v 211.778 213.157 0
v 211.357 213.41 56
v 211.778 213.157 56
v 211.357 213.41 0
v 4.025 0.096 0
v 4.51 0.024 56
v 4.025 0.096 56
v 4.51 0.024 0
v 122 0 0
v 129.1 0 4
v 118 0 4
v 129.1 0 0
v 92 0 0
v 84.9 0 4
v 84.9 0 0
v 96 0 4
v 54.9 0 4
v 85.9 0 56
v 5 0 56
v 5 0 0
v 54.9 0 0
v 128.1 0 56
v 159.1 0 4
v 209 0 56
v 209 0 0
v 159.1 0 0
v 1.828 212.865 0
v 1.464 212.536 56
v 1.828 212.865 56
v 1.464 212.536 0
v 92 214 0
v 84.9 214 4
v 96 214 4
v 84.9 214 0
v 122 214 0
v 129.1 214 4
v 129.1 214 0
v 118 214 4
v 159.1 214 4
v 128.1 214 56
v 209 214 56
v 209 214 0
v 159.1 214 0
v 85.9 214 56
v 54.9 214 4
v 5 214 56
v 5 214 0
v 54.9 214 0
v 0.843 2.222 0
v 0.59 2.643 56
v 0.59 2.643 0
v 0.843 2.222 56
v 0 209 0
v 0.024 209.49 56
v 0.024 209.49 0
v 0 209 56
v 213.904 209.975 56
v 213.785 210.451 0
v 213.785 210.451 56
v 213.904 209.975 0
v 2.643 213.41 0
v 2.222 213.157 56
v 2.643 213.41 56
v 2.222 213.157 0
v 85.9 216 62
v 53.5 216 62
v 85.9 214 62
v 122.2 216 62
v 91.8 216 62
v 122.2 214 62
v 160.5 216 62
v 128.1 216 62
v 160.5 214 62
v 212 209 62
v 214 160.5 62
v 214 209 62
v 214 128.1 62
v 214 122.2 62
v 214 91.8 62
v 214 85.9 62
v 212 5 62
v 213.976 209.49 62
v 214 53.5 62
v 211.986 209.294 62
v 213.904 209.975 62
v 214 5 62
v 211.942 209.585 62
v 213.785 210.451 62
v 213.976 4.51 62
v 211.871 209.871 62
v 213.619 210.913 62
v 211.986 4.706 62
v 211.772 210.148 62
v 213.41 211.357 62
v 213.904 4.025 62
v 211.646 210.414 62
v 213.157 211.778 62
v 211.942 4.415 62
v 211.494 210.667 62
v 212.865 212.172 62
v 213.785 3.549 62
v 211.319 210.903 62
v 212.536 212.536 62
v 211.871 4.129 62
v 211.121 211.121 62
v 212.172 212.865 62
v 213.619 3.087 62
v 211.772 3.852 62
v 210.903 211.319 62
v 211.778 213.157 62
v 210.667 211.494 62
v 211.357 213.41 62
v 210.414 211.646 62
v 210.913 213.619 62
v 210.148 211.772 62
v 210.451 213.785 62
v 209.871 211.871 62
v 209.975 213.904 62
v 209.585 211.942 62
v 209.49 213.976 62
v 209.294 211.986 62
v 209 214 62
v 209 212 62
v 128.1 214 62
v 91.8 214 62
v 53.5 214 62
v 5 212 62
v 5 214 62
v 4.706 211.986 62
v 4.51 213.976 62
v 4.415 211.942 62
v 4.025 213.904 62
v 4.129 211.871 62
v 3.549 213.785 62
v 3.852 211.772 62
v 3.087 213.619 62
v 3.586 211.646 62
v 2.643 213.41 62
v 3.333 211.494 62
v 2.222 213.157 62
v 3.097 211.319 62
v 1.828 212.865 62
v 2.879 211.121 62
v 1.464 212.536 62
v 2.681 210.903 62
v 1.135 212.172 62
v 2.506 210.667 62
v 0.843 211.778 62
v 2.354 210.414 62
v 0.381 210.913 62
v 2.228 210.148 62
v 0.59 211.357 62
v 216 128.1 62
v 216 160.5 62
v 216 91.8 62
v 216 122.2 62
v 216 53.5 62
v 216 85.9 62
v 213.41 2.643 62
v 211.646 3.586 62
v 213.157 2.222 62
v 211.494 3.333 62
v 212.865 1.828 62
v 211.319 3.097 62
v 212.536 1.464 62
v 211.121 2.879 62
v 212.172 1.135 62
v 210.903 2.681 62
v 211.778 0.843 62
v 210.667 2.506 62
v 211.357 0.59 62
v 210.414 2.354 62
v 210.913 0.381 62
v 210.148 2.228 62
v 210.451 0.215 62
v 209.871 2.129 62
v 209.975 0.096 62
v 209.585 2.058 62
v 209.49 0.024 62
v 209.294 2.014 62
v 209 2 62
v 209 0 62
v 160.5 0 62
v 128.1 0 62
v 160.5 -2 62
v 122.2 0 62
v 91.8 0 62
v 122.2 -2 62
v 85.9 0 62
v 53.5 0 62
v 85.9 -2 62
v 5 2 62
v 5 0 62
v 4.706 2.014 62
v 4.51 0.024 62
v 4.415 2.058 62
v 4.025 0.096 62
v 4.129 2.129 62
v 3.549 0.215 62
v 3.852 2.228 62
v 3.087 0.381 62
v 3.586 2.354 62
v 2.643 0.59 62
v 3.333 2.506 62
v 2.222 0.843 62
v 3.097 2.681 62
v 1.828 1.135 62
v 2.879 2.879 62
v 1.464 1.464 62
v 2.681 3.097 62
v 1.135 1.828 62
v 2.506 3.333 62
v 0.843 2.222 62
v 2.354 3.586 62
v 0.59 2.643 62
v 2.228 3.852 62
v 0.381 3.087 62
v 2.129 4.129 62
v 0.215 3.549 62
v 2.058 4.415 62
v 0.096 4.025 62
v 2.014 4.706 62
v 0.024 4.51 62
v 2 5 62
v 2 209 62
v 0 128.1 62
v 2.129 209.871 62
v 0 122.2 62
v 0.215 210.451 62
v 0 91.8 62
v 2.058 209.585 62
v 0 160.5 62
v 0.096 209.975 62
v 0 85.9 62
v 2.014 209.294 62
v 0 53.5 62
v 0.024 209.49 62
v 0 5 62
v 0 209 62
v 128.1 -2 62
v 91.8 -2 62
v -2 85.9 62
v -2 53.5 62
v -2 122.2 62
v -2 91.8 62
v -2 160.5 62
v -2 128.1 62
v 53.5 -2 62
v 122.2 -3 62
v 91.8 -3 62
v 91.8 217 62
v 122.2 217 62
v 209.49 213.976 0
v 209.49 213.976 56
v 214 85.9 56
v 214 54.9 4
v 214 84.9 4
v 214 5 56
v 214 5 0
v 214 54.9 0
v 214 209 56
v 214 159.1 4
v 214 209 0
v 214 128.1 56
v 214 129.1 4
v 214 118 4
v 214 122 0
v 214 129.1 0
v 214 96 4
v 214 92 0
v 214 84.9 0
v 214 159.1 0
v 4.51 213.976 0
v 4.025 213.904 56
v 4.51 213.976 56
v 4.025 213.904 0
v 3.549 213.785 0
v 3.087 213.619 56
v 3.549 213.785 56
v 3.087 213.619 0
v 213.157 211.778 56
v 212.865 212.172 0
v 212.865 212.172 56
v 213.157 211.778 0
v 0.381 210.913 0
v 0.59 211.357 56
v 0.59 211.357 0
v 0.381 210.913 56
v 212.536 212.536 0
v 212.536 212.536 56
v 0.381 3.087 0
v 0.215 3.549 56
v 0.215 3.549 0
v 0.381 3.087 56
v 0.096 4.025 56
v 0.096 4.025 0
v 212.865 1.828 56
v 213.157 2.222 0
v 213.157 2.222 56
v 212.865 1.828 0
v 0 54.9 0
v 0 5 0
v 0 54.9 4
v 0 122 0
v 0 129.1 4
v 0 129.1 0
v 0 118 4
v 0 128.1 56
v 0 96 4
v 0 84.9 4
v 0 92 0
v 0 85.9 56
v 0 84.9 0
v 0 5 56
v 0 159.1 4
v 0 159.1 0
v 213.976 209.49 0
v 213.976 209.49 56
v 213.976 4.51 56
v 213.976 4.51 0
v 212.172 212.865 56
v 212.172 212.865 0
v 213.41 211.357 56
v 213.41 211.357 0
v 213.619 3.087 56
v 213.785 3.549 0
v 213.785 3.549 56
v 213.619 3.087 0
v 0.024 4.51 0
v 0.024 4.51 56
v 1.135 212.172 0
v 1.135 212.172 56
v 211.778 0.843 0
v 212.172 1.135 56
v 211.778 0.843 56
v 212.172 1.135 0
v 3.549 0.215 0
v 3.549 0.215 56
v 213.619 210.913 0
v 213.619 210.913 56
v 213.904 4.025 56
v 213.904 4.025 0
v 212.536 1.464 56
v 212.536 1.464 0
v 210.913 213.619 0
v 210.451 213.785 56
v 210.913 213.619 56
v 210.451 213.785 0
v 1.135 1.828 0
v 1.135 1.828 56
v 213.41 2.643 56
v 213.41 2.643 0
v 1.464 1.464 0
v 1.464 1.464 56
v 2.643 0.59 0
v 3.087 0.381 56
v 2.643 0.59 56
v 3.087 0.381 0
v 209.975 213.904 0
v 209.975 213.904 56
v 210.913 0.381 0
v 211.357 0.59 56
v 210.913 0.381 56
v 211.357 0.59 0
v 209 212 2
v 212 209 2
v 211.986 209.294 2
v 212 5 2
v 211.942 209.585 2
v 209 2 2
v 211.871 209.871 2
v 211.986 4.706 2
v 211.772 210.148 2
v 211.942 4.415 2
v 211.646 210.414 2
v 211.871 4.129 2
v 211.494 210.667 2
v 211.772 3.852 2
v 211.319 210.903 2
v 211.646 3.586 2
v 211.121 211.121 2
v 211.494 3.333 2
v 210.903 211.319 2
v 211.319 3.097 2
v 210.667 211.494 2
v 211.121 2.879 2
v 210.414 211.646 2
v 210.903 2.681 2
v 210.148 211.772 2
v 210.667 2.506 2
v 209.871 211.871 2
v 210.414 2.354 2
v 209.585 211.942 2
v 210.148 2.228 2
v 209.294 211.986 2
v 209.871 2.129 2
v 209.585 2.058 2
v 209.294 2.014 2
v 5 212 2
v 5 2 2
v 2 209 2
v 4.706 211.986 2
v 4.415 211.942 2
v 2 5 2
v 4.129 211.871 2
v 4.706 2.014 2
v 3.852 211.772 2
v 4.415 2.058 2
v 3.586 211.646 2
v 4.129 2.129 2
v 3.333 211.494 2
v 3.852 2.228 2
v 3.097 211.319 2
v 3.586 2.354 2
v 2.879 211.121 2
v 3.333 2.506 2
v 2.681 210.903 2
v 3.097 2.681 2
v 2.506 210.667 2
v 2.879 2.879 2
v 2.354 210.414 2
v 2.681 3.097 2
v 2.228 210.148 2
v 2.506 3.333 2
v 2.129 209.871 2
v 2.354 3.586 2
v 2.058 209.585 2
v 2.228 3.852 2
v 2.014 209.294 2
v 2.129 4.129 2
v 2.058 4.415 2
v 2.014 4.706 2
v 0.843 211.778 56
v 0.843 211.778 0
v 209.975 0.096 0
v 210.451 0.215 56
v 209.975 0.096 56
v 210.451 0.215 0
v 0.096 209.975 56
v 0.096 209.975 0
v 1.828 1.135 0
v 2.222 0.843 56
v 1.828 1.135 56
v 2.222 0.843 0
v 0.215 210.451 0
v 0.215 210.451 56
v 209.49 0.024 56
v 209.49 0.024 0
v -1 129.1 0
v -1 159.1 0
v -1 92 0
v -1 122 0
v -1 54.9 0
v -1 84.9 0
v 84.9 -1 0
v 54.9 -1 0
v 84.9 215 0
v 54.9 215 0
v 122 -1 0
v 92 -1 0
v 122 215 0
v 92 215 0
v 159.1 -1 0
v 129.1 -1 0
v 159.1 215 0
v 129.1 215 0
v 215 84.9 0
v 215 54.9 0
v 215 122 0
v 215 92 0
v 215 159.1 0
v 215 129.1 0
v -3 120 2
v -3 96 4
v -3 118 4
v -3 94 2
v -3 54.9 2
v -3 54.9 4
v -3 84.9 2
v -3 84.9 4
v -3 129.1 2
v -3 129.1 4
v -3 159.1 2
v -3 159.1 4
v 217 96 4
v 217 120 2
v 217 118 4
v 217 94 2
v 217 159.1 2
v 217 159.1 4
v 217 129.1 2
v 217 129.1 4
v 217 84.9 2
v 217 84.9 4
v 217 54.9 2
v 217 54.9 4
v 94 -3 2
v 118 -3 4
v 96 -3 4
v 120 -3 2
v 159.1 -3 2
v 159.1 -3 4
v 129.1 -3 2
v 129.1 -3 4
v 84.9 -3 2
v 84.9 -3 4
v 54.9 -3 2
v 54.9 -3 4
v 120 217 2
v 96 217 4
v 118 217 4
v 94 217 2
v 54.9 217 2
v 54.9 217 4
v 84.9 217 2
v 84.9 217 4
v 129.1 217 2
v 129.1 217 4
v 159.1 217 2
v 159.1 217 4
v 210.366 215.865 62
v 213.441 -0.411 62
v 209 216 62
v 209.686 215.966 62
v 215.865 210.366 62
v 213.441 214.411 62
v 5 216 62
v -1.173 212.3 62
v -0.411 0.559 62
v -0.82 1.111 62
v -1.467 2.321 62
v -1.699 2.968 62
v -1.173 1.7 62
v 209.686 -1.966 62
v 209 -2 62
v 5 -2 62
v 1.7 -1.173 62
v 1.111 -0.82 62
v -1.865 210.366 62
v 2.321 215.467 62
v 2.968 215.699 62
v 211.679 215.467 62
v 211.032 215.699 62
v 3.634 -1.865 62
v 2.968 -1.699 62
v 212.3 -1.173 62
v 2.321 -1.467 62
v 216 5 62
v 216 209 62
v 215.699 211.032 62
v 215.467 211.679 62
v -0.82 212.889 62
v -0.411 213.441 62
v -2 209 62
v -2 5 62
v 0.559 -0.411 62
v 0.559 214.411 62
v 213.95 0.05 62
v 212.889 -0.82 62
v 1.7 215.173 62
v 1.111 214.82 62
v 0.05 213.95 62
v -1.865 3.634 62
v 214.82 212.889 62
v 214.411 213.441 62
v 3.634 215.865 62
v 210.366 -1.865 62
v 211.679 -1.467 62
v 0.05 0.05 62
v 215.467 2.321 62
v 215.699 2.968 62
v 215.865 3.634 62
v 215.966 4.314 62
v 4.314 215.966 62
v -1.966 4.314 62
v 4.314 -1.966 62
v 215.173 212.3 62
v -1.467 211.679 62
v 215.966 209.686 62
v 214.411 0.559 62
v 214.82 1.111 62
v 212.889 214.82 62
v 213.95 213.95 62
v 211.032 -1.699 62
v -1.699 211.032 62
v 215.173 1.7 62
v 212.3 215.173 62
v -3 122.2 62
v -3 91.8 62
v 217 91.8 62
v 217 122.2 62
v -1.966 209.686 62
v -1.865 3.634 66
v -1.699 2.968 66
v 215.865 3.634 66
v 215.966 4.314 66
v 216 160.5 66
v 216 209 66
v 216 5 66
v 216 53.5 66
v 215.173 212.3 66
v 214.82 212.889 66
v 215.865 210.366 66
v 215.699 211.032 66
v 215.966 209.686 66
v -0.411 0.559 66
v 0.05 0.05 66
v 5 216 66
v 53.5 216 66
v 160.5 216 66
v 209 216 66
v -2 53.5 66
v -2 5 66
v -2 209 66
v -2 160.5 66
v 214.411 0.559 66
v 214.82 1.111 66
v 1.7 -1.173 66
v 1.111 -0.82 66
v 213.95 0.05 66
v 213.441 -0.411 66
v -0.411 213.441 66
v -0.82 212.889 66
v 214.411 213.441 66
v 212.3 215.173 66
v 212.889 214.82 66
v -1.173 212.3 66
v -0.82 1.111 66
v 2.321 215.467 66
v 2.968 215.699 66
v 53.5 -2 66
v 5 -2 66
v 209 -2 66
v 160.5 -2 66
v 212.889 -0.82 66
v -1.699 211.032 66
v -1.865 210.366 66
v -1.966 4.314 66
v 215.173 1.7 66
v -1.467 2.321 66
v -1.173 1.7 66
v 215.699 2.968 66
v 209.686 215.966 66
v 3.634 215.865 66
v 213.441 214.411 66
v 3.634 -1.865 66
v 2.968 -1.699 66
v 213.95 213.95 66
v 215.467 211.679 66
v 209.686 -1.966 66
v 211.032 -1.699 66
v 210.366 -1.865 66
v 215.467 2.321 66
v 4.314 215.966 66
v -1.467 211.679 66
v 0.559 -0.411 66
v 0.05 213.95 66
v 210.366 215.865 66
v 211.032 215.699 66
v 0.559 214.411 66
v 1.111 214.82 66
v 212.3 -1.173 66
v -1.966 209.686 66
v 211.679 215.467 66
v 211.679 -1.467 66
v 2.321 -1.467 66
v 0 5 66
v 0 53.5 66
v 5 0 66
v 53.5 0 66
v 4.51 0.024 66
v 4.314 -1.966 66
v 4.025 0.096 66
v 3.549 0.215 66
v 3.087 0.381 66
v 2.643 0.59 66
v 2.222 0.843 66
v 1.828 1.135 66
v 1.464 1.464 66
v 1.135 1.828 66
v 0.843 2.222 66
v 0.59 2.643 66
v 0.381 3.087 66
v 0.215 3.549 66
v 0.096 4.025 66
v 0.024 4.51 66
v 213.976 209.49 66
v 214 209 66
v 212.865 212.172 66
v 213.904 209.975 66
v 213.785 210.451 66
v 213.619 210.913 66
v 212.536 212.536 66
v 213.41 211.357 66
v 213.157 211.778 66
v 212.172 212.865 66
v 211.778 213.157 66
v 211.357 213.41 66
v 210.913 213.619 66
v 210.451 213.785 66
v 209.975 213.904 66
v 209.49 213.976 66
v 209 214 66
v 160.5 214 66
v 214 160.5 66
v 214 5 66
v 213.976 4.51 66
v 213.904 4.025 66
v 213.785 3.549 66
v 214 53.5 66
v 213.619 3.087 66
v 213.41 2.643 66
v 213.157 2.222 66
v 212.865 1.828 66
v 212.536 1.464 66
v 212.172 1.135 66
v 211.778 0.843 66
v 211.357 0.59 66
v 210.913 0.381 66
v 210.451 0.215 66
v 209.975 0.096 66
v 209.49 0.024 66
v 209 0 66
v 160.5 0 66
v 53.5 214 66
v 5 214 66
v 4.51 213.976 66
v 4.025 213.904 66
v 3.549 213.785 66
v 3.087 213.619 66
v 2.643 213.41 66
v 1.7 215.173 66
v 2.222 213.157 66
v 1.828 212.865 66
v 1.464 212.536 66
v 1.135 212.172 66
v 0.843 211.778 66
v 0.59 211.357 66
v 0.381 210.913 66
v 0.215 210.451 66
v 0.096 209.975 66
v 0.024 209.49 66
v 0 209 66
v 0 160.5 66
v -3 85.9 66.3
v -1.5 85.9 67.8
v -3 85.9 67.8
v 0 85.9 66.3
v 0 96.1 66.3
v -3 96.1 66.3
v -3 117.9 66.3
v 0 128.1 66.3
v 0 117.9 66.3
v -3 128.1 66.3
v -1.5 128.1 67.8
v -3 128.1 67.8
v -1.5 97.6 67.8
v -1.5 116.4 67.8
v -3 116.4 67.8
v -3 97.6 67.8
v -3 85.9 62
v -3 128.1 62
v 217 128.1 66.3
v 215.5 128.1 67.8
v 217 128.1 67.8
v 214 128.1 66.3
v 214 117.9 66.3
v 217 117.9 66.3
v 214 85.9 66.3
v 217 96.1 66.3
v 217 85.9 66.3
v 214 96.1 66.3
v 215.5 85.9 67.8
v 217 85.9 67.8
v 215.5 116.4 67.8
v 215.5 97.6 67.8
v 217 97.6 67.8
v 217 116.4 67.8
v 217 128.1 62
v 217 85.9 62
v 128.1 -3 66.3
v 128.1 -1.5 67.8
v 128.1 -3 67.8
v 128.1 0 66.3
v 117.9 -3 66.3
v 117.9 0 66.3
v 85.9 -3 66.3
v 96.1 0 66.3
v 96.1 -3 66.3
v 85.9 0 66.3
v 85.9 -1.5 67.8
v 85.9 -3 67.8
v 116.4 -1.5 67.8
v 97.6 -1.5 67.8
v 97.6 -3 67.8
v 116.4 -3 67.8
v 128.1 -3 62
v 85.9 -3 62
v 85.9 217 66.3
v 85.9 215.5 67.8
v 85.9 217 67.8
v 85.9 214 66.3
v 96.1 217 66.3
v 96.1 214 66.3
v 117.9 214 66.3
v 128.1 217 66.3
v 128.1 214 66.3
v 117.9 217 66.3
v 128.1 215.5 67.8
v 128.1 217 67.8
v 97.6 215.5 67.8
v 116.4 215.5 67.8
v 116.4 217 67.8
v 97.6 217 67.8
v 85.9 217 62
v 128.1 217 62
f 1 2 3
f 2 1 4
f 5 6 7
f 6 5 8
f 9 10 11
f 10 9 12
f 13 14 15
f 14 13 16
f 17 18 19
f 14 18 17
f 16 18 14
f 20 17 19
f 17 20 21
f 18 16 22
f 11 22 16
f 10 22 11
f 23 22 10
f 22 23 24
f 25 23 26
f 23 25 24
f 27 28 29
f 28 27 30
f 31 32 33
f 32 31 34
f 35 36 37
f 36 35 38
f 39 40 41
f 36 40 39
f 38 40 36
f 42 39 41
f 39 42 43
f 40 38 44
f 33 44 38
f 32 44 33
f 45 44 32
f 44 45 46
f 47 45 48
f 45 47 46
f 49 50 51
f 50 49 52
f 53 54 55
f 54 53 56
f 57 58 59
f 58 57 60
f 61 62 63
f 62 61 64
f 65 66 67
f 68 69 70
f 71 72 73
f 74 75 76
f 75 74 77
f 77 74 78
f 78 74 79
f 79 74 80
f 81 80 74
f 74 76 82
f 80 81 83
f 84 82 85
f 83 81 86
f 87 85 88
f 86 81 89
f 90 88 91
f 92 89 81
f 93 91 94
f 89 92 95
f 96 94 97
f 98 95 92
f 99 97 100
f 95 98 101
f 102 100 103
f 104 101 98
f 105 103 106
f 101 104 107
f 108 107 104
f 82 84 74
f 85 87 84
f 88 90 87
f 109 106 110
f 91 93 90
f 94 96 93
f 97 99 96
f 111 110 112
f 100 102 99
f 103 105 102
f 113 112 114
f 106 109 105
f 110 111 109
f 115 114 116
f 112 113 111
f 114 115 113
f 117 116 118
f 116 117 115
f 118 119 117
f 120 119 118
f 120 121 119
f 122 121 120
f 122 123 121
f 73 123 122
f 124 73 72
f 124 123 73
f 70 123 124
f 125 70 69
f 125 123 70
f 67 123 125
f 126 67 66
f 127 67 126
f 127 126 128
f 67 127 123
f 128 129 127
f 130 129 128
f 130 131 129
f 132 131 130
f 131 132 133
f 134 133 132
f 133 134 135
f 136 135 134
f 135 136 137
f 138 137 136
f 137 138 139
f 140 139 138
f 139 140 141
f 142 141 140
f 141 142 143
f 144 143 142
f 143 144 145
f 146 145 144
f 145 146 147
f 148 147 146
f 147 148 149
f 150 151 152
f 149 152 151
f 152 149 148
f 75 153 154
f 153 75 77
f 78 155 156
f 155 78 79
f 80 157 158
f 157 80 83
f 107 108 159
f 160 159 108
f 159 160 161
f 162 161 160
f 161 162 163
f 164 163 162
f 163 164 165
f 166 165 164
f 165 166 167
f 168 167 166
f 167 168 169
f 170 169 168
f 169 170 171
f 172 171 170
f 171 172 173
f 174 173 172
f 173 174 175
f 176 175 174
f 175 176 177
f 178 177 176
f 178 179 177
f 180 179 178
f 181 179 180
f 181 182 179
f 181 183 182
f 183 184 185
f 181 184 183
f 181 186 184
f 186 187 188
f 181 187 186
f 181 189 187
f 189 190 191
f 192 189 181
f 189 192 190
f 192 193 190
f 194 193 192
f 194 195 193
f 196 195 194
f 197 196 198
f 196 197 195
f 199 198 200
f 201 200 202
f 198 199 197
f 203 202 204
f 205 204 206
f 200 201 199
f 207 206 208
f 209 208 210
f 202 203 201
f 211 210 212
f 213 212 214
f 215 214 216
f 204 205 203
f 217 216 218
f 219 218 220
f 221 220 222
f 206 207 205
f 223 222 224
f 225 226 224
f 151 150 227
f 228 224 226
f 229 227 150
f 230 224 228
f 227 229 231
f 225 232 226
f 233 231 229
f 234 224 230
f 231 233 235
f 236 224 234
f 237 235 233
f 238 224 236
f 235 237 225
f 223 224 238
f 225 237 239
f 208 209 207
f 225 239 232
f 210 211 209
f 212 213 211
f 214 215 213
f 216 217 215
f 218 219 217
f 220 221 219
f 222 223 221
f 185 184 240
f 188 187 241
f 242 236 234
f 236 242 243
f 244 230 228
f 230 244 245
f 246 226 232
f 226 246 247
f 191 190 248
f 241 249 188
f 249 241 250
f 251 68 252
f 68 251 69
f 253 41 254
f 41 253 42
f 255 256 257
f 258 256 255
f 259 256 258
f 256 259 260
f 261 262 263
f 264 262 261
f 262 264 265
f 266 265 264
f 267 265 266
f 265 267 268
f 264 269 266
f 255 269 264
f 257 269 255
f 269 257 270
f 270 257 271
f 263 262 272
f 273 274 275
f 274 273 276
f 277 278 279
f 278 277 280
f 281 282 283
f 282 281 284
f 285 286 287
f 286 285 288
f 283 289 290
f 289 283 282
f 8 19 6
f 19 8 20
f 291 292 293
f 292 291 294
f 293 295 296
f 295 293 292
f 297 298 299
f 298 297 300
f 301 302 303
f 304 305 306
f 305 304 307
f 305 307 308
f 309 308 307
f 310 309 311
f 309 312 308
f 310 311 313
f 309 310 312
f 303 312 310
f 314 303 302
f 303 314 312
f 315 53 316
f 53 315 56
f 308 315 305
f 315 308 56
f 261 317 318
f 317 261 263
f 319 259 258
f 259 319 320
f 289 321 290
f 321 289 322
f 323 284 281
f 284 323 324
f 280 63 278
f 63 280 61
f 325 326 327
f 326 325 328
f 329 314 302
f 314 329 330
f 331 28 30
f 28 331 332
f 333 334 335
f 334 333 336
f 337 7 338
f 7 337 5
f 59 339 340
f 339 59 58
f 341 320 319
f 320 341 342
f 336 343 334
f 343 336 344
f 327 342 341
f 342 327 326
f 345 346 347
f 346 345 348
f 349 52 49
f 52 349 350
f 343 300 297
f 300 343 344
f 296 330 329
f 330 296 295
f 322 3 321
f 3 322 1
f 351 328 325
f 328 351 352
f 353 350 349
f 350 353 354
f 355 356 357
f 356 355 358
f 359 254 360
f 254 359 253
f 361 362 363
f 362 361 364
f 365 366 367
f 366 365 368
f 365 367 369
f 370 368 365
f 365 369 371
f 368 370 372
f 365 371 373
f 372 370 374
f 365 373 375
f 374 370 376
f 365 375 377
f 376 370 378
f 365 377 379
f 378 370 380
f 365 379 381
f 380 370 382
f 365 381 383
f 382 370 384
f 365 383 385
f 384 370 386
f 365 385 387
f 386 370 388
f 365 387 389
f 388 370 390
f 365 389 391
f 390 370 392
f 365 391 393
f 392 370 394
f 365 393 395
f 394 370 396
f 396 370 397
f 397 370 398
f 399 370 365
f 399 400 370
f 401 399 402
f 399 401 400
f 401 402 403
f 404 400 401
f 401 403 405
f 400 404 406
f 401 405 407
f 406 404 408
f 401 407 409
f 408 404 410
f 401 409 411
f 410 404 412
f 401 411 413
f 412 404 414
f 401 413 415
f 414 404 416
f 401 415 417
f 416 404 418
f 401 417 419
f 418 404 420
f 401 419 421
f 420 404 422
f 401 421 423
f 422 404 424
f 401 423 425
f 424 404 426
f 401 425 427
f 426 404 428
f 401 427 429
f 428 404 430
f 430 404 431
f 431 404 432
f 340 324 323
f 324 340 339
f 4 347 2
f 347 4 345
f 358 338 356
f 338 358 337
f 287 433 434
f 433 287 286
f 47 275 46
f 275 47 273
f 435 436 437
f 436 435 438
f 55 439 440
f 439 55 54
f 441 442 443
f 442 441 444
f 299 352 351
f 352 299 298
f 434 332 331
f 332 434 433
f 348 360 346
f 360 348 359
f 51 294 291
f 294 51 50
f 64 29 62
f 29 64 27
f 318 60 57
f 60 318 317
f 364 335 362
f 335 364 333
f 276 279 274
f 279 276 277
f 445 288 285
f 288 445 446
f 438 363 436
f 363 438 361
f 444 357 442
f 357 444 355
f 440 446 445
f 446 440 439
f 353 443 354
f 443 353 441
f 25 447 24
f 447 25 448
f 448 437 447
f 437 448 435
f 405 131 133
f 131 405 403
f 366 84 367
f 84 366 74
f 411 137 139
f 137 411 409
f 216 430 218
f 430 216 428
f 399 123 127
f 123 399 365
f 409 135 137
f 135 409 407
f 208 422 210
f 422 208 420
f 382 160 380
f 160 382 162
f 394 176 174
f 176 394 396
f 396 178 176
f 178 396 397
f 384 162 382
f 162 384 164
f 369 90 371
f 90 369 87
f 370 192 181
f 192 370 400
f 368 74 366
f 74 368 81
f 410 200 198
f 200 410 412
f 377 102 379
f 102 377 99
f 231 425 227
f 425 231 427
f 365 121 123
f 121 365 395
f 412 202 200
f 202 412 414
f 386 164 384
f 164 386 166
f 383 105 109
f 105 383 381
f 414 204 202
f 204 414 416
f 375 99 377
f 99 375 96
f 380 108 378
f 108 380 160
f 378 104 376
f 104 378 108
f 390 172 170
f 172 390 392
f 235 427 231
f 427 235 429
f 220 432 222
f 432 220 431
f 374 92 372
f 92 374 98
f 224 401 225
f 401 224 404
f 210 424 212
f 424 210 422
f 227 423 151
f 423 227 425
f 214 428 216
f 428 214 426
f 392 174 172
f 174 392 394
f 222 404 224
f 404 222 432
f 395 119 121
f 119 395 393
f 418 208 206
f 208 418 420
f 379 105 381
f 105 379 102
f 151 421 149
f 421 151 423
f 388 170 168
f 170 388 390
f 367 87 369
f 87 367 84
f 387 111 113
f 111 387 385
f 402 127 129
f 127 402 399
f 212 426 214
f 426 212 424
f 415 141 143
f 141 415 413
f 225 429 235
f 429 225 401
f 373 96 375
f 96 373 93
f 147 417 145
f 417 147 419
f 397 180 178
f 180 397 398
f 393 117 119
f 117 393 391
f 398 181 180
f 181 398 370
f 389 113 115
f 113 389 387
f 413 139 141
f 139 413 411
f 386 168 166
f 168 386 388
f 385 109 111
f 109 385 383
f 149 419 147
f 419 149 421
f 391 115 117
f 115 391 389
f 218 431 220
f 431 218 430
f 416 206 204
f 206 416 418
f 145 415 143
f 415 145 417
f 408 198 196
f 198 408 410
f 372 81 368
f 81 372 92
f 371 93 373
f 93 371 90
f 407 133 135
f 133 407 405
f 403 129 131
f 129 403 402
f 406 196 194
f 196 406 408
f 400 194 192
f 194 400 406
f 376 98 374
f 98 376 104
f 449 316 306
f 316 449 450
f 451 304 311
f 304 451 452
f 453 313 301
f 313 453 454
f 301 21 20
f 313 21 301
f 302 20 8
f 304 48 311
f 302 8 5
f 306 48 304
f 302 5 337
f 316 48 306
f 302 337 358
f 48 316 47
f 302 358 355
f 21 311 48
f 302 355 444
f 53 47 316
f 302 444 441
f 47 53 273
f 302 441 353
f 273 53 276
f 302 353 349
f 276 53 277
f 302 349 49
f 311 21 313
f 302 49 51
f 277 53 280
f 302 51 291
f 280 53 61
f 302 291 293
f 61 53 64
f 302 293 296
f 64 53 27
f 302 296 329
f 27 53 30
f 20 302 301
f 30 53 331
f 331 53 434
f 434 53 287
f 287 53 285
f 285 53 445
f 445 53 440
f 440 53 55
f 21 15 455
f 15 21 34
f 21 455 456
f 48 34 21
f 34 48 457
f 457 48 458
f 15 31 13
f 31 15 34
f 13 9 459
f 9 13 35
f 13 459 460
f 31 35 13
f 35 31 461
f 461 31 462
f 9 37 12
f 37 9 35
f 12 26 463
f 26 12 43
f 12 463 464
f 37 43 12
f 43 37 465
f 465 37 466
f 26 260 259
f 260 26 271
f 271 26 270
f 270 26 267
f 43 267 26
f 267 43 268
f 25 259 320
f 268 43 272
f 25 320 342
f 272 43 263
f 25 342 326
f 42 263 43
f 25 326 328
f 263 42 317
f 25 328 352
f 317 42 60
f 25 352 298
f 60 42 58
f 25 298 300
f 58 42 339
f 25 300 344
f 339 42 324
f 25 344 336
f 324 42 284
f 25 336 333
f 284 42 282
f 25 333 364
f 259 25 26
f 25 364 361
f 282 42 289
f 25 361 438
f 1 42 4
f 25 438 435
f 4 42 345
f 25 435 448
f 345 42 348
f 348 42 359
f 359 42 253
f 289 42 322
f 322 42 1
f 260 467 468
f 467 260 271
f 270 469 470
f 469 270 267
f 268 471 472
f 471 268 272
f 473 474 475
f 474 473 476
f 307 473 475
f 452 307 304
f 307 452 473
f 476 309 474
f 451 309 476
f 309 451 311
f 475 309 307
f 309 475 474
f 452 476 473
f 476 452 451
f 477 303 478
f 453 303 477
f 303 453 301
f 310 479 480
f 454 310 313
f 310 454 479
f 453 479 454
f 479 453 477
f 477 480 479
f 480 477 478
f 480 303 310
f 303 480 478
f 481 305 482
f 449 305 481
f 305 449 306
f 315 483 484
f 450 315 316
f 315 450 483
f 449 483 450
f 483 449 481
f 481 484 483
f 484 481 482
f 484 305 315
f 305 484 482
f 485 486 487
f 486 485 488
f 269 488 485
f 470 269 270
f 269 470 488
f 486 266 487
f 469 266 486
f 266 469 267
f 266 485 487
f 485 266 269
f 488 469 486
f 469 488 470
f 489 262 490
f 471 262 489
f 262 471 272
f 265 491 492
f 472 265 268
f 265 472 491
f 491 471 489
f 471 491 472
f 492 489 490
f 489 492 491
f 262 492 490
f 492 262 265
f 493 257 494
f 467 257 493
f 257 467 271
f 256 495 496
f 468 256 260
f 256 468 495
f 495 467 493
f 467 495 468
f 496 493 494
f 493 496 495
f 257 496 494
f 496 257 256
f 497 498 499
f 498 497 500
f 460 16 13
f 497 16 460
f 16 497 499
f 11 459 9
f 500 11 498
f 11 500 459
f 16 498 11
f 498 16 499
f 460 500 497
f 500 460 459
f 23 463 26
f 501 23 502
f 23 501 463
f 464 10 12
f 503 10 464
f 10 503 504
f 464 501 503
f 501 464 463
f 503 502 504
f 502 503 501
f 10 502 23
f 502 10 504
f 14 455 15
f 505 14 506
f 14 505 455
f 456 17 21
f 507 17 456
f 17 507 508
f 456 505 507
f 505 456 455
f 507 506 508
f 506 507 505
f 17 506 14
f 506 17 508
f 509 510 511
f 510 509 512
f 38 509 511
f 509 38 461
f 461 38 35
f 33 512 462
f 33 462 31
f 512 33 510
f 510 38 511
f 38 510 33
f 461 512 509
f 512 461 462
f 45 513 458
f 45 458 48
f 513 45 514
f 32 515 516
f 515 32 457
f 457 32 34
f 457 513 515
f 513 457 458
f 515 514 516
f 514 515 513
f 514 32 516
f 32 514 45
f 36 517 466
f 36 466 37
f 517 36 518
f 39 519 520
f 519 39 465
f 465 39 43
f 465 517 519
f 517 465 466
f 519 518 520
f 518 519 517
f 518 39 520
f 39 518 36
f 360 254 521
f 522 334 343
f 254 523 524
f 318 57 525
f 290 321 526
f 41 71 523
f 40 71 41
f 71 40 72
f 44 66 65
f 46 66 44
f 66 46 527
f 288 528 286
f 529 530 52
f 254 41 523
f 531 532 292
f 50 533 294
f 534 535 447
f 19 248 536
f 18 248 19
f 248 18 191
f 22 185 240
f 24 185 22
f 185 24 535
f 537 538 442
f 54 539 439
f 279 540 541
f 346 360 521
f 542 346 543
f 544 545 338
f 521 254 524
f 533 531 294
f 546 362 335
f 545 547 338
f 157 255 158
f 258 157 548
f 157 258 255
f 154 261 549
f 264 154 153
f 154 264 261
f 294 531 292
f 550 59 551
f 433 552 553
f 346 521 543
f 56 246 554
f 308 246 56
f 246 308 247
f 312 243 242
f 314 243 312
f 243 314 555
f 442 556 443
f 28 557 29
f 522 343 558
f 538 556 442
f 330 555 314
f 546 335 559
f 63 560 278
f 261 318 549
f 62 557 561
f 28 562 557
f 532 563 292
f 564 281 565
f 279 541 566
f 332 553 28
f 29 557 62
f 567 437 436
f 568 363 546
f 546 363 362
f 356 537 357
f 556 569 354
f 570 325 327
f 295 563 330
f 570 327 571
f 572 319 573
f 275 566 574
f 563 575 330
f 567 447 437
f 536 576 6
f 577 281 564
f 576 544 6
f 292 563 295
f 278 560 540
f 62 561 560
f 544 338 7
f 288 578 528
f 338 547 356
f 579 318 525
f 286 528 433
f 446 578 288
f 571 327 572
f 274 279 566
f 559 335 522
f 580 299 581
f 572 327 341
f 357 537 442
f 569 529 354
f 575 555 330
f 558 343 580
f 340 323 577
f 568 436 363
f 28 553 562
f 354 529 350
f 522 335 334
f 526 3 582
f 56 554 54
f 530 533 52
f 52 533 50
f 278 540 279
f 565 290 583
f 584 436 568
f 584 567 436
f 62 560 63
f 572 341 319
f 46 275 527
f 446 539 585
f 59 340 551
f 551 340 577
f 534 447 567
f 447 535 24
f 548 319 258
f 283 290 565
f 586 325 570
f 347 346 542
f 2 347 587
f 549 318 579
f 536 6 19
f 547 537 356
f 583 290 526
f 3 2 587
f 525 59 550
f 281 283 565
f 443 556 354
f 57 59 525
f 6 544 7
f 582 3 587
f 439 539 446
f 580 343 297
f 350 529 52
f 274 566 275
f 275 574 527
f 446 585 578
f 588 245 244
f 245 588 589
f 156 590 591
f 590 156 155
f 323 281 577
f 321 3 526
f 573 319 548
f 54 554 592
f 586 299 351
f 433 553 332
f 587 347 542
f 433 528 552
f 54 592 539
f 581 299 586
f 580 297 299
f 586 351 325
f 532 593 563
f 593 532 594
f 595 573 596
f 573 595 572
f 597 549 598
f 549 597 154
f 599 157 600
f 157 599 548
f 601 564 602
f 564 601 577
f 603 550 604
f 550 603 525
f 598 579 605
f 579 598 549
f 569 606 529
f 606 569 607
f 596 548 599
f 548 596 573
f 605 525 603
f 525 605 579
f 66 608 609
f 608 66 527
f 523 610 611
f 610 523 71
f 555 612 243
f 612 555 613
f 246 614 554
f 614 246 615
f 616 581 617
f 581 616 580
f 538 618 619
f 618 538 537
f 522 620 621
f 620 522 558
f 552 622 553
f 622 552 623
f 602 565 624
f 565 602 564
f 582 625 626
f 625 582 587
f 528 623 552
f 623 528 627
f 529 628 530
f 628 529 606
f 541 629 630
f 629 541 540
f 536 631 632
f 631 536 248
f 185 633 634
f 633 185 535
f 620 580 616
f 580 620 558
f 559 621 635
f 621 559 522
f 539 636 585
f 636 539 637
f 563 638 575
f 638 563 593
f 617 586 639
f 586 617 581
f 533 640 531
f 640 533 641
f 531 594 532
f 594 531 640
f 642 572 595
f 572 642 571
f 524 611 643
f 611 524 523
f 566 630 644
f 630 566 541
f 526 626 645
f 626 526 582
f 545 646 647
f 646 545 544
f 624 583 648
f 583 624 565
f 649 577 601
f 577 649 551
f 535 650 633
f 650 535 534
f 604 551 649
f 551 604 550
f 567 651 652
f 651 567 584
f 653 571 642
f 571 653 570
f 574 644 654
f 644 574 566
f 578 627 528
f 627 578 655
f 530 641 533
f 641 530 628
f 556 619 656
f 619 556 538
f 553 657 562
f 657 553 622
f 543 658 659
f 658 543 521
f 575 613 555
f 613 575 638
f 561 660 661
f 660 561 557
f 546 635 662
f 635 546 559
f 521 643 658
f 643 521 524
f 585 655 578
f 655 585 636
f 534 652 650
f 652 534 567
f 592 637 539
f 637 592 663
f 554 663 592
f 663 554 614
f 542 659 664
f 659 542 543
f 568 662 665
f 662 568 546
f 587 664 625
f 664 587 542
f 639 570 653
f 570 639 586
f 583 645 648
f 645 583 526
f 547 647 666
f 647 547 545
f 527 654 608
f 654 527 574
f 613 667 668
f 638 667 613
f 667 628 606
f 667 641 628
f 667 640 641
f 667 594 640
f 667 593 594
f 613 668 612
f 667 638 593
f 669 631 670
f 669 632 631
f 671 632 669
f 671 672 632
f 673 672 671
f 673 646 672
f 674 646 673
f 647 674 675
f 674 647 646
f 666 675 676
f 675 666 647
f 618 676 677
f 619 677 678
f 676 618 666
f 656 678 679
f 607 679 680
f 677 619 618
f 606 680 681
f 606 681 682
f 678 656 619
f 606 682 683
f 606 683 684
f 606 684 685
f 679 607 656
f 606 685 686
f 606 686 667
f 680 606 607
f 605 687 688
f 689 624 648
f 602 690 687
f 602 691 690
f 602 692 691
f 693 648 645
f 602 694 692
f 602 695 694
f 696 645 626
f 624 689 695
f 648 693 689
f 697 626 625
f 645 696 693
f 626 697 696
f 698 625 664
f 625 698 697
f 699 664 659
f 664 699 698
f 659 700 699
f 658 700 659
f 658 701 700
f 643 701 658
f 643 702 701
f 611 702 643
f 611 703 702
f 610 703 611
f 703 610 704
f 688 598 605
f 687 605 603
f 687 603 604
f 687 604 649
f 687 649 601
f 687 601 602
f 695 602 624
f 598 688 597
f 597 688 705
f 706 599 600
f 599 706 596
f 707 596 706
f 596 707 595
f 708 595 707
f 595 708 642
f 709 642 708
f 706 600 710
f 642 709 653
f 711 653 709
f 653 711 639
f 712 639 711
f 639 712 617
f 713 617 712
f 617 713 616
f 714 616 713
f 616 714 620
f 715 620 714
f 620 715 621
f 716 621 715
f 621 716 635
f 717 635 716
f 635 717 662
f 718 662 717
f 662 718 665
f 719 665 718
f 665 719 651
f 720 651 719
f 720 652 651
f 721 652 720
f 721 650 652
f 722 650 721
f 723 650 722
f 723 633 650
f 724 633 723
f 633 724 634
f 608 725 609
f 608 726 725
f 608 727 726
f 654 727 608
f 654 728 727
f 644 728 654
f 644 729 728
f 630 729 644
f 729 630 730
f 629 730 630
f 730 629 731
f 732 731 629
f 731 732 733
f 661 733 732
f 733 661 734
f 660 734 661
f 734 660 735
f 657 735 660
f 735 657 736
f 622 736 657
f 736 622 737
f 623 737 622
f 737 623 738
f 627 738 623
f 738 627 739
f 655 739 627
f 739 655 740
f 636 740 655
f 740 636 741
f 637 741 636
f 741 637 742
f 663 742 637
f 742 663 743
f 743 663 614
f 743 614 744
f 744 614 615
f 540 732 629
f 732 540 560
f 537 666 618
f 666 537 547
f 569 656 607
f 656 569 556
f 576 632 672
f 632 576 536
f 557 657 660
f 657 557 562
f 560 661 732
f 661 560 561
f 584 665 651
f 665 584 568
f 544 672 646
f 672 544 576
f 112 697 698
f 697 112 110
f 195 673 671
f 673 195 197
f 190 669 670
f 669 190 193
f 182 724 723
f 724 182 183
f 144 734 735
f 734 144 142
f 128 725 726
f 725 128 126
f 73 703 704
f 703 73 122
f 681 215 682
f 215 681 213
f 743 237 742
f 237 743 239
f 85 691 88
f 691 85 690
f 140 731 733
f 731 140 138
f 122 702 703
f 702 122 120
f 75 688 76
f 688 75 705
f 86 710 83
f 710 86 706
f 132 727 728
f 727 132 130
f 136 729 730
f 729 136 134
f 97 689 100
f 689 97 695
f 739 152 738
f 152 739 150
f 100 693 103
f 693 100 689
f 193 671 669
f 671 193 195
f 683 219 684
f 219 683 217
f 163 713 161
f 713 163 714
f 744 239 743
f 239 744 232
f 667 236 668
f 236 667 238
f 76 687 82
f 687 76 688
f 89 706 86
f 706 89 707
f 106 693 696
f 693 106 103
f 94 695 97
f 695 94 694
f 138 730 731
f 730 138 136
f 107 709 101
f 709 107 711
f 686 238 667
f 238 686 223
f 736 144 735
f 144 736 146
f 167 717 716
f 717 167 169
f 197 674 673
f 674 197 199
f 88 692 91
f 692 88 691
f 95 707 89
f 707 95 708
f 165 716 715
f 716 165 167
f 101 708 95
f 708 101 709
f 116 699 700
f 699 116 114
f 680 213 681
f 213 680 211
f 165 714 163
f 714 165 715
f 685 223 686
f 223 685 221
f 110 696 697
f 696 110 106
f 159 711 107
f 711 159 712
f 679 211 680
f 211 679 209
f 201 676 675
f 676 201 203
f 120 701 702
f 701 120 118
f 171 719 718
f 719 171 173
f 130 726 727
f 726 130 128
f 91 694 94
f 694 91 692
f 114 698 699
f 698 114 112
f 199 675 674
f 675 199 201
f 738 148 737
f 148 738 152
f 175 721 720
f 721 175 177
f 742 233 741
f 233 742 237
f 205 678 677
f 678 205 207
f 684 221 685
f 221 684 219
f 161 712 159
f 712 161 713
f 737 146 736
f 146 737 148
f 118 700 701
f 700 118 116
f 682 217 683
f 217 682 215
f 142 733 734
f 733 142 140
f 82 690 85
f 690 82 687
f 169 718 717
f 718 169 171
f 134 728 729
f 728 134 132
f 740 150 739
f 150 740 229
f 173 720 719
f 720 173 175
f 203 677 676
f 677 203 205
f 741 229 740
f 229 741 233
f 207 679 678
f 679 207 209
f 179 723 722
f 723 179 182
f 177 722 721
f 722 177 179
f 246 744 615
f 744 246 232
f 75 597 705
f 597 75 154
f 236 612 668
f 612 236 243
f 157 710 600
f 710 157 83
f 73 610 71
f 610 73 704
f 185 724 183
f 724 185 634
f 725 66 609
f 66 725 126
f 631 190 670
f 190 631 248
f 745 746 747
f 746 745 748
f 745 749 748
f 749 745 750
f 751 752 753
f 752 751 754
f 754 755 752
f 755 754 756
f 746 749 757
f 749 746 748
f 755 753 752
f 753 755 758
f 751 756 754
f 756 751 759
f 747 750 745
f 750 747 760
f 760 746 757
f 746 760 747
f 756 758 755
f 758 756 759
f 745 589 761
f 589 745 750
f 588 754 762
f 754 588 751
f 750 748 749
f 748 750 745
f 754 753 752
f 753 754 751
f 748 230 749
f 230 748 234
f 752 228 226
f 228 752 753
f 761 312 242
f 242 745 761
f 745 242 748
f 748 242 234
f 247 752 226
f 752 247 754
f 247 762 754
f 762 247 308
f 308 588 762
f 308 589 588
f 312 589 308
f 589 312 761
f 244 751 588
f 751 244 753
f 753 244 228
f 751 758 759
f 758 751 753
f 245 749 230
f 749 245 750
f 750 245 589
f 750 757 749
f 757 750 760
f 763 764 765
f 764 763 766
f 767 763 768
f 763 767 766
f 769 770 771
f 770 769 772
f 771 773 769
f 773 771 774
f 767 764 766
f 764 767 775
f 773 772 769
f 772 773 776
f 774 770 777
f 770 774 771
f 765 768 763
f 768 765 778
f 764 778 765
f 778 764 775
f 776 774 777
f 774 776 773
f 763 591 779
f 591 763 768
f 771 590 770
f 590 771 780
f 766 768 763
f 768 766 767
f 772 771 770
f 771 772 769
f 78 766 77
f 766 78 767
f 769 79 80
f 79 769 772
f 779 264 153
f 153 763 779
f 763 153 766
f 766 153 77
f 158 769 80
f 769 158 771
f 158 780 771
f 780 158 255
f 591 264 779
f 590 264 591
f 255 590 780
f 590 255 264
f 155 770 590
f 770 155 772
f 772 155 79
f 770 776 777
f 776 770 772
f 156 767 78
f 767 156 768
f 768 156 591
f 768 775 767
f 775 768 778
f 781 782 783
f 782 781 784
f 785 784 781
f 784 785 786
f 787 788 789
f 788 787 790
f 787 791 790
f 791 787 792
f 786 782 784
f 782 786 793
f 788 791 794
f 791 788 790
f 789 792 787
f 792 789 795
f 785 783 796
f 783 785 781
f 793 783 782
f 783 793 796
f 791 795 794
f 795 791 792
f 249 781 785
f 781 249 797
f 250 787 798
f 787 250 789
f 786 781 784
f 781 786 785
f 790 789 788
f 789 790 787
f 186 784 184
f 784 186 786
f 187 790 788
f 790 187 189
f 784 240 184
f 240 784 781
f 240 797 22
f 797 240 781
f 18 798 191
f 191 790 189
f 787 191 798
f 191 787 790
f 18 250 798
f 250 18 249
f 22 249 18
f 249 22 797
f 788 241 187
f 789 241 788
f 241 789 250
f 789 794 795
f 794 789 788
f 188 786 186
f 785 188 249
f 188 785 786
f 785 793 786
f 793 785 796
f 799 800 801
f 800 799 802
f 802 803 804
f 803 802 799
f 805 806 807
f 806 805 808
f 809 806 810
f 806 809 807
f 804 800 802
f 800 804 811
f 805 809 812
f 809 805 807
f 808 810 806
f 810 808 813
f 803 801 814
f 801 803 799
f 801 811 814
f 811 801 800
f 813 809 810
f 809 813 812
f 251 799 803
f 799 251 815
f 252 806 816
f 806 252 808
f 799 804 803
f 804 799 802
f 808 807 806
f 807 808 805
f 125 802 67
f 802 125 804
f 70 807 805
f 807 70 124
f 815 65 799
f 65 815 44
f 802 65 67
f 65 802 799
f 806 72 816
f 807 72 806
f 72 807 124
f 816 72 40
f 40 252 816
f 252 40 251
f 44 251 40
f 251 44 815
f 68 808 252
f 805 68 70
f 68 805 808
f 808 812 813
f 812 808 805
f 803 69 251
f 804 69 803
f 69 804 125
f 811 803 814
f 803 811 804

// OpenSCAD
// file: Primitives.scad
module triangular_profile(width, height, depth, points=[[0.5, 0.5],[1, 0], [0, 0]]){
  translate([0, depth, 0]) {
    rotate(90, [1, 0, 0]) {
      linear_extrude(height=depth) {
        polygon(
          points=[
            [width * points[0][0], height * points[0][1]], // top
            [width * points[1][0], height * points[1][1]], // right
            [width * points[2][0], height * points[2][1]] // left
          ], 
          paths=[[0,1,2]]
        );
      }
    }
  }
}
// file: Alignments.scad
module mirror(offsetX, offsetY, offsetZ) {
  translate([offsetX, offsetY, offsetZ]) {
    children(0);
  }

  translate([-offsetX, -offsetY, -offsetZ]) {
    children(0);
  }
}


module center(width, depth, height) {
  translate([-width / 2, -depth / 2, -height / 2]) {
    children();
  }
}
// file: X-Wing Box Slide Clamp.scad
module clip_holder(depth = 20, wall_thickness = 2, tolerance = 0.2) {
    // hanger
    translate([0, 0, -wall_thickness]) {
      cube(size=[wall_thickness * 1.5, depth, wall_thickness]);
    }
  
    translate([wall_thickness * 0.5, 0, 0]) {
      // clip
      translate([0, 0, -wall_thickness*2]) {
        translate([0, depth, 0]) {
          rotate(90, [1, 0, 0]) {
            linear_extrude(height=depth) {
                polygon(points=[[wall_thickness,0],[0, wall_thickness],[wall_thickness,wall_thickness]], paths=[[0,1,2]]);
            }
          }
        }
      }
    }
}

module clip_holder_mount_notches(depth = 20, height = 10, wall_thickness = 2, tolerance = 0.2) {
  union() {
    // right
    translate([wall_thickness, 0, -height / 2]) {
      rotate(45, [0, 0, 1]) {
        cube(size=[wall_thickness + tolerance, wall_thickness + tolerance, height + 0.2], center=true);
      }
    }

    // left
    translate([wall_thickness, depth, -height / 2]) {
      rotate(45, [0, 0, 1]) {
        cube(size=[wall_thickness + tolerance, wall_thickness + tolerance, height + 0.2], center=true);
      }
    }

    // bottom
    translate([wall_thickness, depth / 2, -height]) {
      rotate(45, [0, 1, 0]) {
        cube(size=[wall_thickness + tolerance, depth + 0.2, wall_thickness + tolerance], center=true);
      }
    }
  }
}


module clip_holder_mount(depth = 20, height = 10, wall_thickness = 2) {
  translate([0, 0, -height]) {
    cube(size=[(wall_thickness + wall_thickness), depth, height]);
  }
}

module wall_mounted_clip_holder (depth = 20, height = 10, wall_thickness = 2, tolerance = 0.2) {
  translate([-wall_thickness * 1.5, -depth / 2, 0]) {
    difference() {
      union() {
        clip_holder_mount(depth, height, wall_thickness);
        translate([wall_thickness * 2, 0, 0]) {
          clip_holder(depth, wall_thickness, tolerance);
        }
      }

      clip_holder_mount_notches(depth, height, wall_thickness, tolerance);
    }
  }
}

module base_mounted_clip_holder (depth = 20, wall_thickness = 2, tolerance = 0.2) {
  translate([-wall_thickness * 1.5, depth / 2, 0]) {
    rotate(180, [1, 0, 0]) {
      union() {
        clip_holder_mount(depth, wall_thickness, wall_thickness);
        translate([wall_thickness * 2, 0, 0]) {
          clip_holder(depth, wall_thickness, tolerance);
        }
      }  
    }
  }
}

module wall_mount_hole (depth = 20, height = 10, wall_thickness = 2, tolerance = 0.2) {

  translate([-wall_thickness * 1.5, -depth / 2, tolerance]) {
    difference() {
      union() {
        clip_holder_mount(depth, height + tolerance, wall_thickness);
      }

      clip_holder_mount_notches(depth, height, wall_thickness, 0);
    }
  }
}


module clip(depth = 10, height = 10, wall_thickness = 2, tolerance = 0.2) {
  full_height = wall_thickness * 6 + tolerance * 4;
 
  translate([0, -depth/2, -full_height / 2]) {
    cube(size=[wall_thickness, depth, full_height]);
  
    translate([wall_thickness/2 + tolerance, 0, 0]) {
      translate([0, 0, full_height]) {
        clip_holder(depth, wall_thickness, tolerance);
      }

      translate([wall_thickness * 1.5, 0, 0]) {
        cube(size=[wall_thickness / 2 - tolerance, depth, wall_thickness * 2]); 
      }

      translate([wall_thickness * 1.5, 0, full_height - wall_thickness * 2]) {
        cube(size=[wall_thickness / 2 - tolerance, depth, wall_thickness * 2]); 
      }
    
      translate([0, depth, 0]) {
        rotate(180, [1, 0, 0]) {
          clip_holder(depth,  wall_thickness, tolerance);
        }
      }
    }
  }
}


assembled = false;
rotationAngle = 0;

wall_thickness = 2;
tolerance = 0.2;
depth = 20;

// !clip(tolerance=tolerance, wall_thickness=wall_thickness, depth=depth);
// !clip_holder_mount(depth=depth, wall_thickness=wall_thickness, tolerance=tolerance);
// !wall_mounted_clip_holder(depth=depth, wall_thickness=wall_thickness, tolerance=tolerance);
// !wall_mount_hole(depth=depth, wall_thickness=wall_thickness, tolerance=tolerance);
!base_mounted_clip_holder(depth=depth, wall_thickness=wall_thickness, tolerance=tolerance);

if (assembled) {
  wall_mounted_clip_holder(tolerance=tolerance, wall_thickness=wall_thickness, depth=depth);
  
  translate([0, 0, 0]) {
    rotate(180, [1, 0, 0]) {
      wall_mounted_clip_holder(tolerance=tolerance, wall_thickness=wall_thickness, depth=depth);
    }
  }
  
  translate([wall_thickness * 4.5 + tolerance, 0, 0]) {
    rotate(180, [0, 1, 0]) {
      clip(tolerance=tolerance, wall_thickness=wall_thickness, depth=depth);
    }
  }
} else {
  rotate(-1 * rotationAngle, [0, 1, 0]) {
    wall_mounted_clip_holder(tolerance=tolerance, wall_thickness=wall_thickness, depth=depth);  
  }

  translate([0, depth * 1.5, wall_thickness * 2 + tolerance]) {
    rotate(rotationAngle, [0, 1, 0]) {
      clip(tolerance=tolerance, wall_thickness=wall_thickness, depth=depth);
    }  
  }
}
// file: Box Properties.scad
WallThickness = 3;
CornerRadius = 4;
Tolerance = 5;
function createBoxProperties(width = 214, depth = 214, height = 60, wall_thickness = 2, radius = 5, tolerance = 0.1) = [width, depth, height, wall_thickness, radius, tolerance];

function mutateBoxProperties(boxProperties, width, depth, height, wall_thickness, radius, tolerance) = [
  is_undef(width) ? boxProperties.x : width, 
  is_undef(depth) ? boxProperties.y : depth, 
  is_undef(height) ? boxProperties.z : height, 
  is_undef(wall_thickness) ? boxProperties[WallThickness] : wall_thickness, 
  is_undef(radius) ? boxProperties[CornerRadius] : radius, 
  is_undef(tolerance) ? boxProperties[Tolerance] : tolerance
];
// main file
include <Box Properties.scad>
use <Box.scad>
use <X-Wing Box Wall Mounts.scad>

clickLockTongueDepth = 30;
clickLockDepth = 50;
clickLockFingerLipDepth = 30;

module xwing_box_click_lock_tongue(wall_thickness) {
  wall_mounted_snap_lock_tongue(tongueDepth = clickLockTongueDepth, fingerLipDepth = clickLockFingerLipDepth, wall_thickness = wall_thickness, tolerance = 0.1);
}

module xwing_box_click_lock(wall_thickness) {
  wall_mounted_snap_lock(tongueDepth = clickLockTongueDepth, wall_thickness = wall_thickness, tolerance = 0.1);
}

module xwing_box(boxProperties) {
  box(boxProperties) {
    xwing_box_click_lock_tongue(wall_thickness = boxProperties[WallThickness]);
    xwing_box_click_lock_tongue(wall_thickness = boxProperties[WallThickness]);
    xwing_box_click_lock_tongue(wall_thickness = boxProperties[WallThickness]);
    xwing_box_click_lock_tongue(wall_thickness = boxProperties[WallThickness]);
    xwing_box_click_lock(wall_thickness = boxProperties[WallThickness]);
    xwing_box_click_lock(wall_thickness = boxProperties[WallThickness]);
    xwing_box_click_lock(wall_thickness = boxProperties[WallThickness]);
    xwing_box_click_lock(wall_thickness = boxProperties[WallThickness]);
  }

  if ($children > 0) {
    difference() {
      union() {
        translate([boxProperties[WallThickness], boxProperties[WallThickness], boxProperties[WallThickness]]) {
          for(i=[0:$children-1])
            children(i);  
        }
      }

      if (!$preview)
        boxOuterWallClipShape(boxProperties[WallThickness], boxProperties.x, boxProperties.y, boxProperties.z, boxProperties[CornerRadius]);
    }
  }
}


module xwing_box_lid(boxProperties) {
  lid(boxProperties) {
    xwing_box_click_lock_tongue(wall_thickness = boxProperties[WallThickness]);
    xwing_box_click_lock_tongue(wall_thickness = boxProperties[WallThickness]);
    xwing_box_click_lock_tongue(wall_thickness = boxProperties[WallThickness]);
    xwing_box_click_lock_tongue(wall_thickness = boxProperties[WallThickness]);
  }
}

showBox = true;
showLid = false;

boxProperties = createBoxProperties(width = 214, depth = 214, height = 60, radius = 5, wall_thickness = 2);

if (showBox) {
  xwing_box(boxProperties);
}

if (showLid) {
  translate([0, 0, 65]) {
    xwing_box_lid(boxProperties);
  }
}
